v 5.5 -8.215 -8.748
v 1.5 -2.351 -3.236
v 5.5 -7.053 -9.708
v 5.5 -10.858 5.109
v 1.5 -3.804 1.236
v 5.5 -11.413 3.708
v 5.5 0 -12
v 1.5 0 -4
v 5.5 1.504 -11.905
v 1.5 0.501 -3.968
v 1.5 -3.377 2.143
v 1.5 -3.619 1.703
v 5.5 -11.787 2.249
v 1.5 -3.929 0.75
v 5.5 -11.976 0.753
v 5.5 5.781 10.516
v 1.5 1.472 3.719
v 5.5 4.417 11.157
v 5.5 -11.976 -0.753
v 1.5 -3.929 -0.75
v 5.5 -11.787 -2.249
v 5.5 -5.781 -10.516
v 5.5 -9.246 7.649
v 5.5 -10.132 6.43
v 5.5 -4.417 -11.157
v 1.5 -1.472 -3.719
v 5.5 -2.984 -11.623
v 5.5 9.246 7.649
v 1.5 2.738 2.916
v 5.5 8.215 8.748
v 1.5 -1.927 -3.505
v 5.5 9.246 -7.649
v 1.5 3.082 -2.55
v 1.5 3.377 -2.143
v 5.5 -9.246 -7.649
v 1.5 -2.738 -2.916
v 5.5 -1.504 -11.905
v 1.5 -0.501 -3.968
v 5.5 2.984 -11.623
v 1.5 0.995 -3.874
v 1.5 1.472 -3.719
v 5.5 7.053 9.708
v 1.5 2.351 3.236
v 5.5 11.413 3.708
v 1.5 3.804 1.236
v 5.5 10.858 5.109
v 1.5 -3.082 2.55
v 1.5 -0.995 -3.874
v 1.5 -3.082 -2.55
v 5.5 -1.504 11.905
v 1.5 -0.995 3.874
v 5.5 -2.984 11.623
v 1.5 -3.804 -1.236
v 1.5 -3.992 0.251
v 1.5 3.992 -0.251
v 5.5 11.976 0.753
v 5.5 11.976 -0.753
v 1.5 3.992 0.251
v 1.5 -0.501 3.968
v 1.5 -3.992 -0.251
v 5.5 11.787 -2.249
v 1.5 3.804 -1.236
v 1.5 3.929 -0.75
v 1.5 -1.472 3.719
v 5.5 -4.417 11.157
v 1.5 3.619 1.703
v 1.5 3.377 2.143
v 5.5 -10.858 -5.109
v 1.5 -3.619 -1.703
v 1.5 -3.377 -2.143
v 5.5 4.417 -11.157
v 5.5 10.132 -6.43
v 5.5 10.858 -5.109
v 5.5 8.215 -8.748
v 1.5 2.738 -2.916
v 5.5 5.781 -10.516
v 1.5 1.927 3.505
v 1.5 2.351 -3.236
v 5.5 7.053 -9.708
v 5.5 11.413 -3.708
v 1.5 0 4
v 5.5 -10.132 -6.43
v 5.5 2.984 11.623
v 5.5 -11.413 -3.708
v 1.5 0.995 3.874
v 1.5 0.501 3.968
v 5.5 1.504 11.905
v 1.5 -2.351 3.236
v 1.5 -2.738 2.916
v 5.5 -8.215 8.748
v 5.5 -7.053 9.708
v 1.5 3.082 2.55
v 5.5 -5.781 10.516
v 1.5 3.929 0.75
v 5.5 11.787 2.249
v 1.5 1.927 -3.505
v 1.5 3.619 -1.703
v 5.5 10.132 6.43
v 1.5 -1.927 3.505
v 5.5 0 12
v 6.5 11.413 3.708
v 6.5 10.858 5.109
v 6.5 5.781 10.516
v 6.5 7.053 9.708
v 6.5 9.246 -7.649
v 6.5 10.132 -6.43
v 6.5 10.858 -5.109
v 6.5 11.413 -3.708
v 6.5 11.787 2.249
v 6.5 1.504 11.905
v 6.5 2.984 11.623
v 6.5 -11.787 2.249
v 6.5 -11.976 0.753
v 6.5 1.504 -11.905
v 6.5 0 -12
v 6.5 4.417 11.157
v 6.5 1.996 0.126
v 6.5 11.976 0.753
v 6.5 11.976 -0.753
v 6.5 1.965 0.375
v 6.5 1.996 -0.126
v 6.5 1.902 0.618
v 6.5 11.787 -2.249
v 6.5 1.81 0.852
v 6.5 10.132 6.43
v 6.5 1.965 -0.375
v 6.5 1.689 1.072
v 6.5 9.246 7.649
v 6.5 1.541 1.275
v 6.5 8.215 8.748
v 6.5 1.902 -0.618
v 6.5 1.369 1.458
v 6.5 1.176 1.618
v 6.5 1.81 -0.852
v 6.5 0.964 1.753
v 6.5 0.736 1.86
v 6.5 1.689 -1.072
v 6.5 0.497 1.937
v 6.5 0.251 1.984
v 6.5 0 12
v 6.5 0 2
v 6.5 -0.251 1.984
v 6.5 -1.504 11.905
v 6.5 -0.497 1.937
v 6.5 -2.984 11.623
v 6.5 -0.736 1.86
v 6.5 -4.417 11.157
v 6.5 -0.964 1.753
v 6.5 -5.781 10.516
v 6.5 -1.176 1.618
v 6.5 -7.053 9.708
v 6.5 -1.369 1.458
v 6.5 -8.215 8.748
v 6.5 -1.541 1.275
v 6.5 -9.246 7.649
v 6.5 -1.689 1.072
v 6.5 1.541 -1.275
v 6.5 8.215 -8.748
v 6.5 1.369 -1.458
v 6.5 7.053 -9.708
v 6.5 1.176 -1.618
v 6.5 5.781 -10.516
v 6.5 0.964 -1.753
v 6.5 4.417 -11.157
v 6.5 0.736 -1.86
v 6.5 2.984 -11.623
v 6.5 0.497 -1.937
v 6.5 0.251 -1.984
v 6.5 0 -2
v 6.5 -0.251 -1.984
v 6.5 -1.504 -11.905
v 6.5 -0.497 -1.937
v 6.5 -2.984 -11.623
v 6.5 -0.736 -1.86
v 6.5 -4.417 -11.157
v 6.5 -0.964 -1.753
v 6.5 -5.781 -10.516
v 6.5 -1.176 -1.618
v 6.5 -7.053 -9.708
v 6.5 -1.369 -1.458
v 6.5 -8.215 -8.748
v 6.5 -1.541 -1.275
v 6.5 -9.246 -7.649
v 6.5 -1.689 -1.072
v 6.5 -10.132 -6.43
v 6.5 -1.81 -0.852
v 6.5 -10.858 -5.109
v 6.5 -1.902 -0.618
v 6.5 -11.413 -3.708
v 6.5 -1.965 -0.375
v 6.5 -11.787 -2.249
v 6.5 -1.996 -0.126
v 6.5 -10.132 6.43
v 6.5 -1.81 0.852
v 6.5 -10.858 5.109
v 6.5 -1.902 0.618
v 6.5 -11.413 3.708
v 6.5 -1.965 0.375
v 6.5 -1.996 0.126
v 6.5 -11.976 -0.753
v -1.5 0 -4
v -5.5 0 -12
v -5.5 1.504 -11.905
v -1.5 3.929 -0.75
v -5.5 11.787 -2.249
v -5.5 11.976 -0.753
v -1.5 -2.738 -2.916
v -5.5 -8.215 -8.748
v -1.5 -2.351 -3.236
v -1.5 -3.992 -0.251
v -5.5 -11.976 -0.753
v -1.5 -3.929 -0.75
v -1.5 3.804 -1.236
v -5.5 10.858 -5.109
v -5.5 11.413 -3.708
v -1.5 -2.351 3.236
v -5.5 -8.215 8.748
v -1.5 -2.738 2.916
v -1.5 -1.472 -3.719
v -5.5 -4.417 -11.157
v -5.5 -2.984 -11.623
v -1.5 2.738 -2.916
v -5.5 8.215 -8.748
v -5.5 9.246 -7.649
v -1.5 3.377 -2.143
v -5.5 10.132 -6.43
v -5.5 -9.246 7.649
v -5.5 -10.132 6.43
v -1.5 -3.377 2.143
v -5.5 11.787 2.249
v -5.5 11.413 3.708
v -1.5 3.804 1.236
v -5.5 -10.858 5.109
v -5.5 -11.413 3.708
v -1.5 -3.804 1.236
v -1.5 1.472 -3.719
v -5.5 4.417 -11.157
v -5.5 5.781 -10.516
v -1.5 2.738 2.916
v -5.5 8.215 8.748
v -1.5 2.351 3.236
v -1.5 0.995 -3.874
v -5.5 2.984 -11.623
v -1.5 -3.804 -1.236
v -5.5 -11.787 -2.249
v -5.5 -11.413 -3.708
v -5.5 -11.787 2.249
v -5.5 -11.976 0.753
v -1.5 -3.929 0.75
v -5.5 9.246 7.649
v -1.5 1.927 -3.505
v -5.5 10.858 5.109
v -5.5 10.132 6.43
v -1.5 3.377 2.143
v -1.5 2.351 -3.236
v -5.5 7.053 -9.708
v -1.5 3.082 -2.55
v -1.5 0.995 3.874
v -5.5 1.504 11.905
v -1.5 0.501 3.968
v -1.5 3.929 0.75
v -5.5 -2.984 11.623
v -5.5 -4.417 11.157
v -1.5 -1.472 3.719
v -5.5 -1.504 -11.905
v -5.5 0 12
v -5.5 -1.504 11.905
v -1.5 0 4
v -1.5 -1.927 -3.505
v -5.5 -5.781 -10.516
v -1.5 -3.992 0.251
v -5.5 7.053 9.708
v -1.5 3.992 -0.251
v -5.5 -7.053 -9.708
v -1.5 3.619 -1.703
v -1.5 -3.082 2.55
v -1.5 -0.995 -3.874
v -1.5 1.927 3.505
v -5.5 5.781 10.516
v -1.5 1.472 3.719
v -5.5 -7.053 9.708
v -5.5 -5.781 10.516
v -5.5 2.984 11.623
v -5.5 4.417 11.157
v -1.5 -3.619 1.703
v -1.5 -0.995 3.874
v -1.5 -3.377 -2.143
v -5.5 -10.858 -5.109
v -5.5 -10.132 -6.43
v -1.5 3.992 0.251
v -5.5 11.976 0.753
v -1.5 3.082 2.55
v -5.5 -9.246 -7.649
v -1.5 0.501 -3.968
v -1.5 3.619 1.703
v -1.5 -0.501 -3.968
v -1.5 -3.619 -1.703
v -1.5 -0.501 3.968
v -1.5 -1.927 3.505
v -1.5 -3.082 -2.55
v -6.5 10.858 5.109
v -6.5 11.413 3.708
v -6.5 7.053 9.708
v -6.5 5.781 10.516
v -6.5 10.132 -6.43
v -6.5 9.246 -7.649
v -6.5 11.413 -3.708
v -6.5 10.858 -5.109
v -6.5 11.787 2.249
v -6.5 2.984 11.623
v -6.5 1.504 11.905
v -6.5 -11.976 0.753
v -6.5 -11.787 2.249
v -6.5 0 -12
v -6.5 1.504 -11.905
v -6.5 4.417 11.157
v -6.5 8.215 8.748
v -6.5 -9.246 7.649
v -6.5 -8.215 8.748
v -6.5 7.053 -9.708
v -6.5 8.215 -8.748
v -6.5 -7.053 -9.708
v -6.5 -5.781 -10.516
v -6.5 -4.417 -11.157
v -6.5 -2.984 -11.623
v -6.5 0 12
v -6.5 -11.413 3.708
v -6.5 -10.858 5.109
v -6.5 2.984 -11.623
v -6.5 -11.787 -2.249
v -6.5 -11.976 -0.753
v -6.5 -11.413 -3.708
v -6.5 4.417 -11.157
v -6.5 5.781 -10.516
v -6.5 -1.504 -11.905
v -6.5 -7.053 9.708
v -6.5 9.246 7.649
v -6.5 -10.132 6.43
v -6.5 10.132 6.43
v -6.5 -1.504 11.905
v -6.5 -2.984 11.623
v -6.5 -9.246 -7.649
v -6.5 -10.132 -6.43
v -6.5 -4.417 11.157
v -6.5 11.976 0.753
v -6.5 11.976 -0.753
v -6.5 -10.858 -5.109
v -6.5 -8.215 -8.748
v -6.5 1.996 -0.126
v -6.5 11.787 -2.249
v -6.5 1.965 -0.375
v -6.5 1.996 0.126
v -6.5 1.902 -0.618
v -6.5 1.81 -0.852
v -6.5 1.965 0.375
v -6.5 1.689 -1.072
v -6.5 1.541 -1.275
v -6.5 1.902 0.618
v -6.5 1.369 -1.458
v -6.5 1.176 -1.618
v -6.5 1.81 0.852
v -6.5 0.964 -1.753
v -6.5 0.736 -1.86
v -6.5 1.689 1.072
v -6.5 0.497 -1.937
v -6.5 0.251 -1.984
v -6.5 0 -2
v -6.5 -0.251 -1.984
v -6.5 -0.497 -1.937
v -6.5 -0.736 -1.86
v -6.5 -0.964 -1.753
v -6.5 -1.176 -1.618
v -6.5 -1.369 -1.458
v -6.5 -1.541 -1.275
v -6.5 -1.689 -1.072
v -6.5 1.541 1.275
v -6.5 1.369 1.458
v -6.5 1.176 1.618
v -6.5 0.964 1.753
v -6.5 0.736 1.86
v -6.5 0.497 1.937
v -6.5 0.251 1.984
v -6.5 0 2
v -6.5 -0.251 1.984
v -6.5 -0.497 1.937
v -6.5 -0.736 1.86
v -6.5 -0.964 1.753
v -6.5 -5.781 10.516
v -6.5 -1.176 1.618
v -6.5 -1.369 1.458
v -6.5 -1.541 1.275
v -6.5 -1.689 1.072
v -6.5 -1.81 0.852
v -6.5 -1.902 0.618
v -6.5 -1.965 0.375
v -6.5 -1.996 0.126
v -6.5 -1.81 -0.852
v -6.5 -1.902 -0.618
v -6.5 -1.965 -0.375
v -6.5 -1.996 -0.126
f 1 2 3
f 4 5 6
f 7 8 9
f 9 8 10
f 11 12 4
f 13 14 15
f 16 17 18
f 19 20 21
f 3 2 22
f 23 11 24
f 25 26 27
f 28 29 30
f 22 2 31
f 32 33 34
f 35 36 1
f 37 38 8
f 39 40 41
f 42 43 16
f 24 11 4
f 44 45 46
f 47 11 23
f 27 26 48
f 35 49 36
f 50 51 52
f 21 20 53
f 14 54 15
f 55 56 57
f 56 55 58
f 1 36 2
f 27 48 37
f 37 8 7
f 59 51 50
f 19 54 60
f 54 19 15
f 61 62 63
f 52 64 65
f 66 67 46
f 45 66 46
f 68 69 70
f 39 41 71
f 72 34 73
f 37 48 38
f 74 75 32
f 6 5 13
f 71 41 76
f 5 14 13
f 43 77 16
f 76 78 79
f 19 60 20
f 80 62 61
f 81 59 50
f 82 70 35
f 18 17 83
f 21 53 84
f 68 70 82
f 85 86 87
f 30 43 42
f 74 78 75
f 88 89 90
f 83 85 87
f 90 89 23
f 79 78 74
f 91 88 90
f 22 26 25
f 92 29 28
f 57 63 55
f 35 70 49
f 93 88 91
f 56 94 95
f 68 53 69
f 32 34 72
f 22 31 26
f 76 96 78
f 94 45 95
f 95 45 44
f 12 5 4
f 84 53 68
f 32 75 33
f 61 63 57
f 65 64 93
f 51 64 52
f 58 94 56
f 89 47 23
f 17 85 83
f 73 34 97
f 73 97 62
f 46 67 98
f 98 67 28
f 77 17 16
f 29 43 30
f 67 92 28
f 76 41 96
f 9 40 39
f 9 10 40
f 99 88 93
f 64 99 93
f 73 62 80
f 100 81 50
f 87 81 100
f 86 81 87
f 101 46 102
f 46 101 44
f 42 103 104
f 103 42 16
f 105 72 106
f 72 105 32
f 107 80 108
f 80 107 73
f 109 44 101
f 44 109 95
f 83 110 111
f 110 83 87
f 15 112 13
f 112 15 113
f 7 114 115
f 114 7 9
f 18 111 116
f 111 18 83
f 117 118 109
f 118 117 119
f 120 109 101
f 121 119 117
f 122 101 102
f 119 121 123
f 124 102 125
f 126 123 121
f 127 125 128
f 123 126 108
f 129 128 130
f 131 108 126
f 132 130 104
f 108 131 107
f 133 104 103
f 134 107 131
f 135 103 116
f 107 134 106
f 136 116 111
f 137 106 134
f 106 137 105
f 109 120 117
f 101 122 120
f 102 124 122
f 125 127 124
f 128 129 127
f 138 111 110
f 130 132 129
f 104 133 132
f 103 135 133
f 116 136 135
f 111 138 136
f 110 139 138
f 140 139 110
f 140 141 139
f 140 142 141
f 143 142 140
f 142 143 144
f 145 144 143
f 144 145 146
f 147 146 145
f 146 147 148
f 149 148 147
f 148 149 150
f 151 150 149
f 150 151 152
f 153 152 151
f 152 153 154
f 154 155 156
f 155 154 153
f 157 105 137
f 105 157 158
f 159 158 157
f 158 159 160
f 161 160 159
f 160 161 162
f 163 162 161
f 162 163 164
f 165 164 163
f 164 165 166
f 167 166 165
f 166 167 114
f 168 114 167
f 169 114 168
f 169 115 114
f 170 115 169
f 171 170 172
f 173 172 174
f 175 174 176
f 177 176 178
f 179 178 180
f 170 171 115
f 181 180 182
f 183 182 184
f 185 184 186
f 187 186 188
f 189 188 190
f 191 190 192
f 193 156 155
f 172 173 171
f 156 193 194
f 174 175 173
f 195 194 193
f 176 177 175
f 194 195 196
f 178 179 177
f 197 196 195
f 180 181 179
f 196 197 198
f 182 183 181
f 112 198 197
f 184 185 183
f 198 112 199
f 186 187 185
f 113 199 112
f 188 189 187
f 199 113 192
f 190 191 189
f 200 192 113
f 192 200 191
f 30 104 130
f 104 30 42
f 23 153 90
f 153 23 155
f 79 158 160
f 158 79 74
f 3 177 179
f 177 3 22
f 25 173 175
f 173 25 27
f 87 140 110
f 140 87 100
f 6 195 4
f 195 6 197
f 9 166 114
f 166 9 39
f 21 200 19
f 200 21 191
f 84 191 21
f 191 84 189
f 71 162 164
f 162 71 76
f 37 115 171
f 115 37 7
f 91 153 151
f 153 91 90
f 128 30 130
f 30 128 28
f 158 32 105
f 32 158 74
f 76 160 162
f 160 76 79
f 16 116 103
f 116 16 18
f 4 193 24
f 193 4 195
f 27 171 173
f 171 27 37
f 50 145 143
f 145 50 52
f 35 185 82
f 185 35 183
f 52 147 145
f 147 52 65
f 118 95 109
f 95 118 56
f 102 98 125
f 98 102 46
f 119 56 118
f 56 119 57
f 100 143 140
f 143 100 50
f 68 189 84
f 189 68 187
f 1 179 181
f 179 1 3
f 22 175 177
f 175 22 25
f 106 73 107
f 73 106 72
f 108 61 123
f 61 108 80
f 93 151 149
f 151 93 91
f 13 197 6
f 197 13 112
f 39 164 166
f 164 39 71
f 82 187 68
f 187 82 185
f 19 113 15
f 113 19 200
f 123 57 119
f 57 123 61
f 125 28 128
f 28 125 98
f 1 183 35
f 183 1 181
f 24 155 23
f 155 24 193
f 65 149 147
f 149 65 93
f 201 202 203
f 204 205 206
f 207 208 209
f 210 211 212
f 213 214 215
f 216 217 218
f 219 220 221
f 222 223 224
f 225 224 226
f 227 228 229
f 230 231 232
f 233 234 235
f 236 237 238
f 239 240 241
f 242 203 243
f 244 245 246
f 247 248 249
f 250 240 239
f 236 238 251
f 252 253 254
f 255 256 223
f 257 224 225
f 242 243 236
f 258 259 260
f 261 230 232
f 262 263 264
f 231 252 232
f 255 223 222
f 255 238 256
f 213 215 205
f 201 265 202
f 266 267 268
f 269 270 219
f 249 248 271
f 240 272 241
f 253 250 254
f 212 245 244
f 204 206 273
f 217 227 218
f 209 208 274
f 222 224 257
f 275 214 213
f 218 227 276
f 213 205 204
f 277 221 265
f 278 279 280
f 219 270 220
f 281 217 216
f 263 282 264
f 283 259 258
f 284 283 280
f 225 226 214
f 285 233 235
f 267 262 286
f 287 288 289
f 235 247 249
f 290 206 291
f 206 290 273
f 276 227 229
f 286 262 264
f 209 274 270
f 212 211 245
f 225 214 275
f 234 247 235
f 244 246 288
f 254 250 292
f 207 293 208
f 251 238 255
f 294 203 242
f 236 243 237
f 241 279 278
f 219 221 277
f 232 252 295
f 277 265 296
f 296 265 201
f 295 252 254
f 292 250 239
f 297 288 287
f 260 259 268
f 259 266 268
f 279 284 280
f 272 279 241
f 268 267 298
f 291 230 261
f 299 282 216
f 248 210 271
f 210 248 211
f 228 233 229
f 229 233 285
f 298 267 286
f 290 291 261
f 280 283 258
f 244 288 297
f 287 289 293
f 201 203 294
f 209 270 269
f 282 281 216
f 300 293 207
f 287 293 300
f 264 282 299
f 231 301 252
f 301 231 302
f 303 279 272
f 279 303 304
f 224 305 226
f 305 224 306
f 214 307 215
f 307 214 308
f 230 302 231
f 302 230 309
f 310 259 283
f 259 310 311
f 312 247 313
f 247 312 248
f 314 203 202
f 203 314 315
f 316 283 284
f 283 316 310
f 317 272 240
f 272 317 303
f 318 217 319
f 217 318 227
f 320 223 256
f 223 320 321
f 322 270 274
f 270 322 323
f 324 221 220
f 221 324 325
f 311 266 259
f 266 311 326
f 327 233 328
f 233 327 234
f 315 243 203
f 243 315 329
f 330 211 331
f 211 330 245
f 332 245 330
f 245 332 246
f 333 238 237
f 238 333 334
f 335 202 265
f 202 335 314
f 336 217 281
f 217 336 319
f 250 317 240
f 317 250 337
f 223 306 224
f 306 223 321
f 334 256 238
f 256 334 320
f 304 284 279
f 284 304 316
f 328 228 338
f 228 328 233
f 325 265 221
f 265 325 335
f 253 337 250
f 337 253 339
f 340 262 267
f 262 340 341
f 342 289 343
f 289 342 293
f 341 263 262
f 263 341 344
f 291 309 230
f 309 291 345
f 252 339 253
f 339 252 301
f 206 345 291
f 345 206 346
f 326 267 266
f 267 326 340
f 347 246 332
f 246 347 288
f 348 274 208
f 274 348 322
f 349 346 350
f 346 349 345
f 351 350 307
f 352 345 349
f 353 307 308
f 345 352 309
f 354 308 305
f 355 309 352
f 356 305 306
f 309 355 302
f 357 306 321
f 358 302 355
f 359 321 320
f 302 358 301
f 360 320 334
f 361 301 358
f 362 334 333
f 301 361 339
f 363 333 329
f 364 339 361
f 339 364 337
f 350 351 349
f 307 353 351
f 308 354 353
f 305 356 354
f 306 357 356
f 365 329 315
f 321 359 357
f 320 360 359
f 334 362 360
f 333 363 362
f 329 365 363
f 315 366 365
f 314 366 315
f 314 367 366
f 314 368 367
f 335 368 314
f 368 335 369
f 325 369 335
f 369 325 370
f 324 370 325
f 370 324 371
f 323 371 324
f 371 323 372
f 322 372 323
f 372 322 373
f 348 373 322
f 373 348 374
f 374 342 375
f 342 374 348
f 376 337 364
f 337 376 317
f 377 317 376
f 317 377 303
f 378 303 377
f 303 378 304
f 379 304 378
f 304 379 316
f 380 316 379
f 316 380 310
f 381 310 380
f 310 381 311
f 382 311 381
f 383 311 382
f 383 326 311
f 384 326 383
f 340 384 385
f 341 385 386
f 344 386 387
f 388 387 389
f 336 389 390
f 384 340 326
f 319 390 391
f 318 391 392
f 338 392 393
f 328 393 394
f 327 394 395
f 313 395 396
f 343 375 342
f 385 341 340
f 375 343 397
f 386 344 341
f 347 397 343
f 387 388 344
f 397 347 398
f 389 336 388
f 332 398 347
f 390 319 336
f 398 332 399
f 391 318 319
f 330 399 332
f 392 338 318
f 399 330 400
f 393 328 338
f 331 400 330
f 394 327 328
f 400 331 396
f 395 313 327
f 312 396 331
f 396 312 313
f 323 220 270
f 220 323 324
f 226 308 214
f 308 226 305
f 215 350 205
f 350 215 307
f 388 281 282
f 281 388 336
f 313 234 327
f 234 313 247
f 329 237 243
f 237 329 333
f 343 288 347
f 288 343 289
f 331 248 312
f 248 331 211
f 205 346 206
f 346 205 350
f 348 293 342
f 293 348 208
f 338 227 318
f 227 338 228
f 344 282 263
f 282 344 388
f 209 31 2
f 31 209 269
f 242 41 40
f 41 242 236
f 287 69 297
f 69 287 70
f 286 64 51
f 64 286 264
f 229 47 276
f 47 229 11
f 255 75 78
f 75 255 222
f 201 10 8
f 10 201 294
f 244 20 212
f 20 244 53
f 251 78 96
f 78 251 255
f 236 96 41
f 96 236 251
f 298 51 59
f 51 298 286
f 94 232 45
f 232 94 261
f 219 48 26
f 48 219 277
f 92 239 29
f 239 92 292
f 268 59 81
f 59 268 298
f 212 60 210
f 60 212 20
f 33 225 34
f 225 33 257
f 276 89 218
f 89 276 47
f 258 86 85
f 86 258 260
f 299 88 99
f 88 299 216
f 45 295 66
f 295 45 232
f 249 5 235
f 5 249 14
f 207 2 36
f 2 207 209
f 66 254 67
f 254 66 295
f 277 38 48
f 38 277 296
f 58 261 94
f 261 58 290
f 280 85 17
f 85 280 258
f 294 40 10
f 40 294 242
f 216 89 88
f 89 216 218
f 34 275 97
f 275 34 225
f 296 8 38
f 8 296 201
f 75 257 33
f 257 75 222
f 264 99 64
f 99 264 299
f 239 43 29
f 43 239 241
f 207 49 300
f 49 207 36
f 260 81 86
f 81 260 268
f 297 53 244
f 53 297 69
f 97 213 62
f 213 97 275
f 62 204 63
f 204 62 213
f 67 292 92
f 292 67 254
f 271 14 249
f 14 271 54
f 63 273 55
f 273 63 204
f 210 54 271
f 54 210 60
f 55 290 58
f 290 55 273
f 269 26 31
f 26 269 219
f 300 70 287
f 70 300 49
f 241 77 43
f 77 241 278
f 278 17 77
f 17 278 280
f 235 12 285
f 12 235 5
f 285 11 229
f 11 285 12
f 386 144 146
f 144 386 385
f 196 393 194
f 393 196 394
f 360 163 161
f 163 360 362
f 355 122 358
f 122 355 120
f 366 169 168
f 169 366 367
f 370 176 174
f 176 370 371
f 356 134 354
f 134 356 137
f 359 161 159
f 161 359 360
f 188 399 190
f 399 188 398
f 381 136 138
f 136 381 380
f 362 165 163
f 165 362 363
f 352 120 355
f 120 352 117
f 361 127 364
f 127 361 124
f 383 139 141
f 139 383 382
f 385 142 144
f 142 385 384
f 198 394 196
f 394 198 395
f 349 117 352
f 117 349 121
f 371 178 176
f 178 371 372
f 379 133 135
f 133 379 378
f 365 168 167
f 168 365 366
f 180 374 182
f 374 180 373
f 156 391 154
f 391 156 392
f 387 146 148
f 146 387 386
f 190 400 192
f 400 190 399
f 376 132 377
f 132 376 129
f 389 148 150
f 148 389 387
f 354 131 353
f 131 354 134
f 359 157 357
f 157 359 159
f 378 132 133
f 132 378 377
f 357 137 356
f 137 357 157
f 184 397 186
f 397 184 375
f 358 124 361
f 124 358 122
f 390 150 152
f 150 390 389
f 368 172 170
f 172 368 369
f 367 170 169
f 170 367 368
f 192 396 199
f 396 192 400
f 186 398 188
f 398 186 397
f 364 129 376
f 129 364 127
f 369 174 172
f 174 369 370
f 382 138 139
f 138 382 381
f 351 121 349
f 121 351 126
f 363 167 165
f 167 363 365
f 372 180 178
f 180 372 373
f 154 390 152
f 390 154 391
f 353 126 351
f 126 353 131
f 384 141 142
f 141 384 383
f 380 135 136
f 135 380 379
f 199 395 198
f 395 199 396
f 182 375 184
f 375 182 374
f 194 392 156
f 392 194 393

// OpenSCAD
module reel(){
  difference(){
   union(){
    translate([3.5,0,0]) rotate([0,90,0]) cylinder(h = 4, r1 = 4, r2 = 12, center=true);
translate([6,0,0]) rotate([0,90,0]) cylinder(h = 1, r = 12, center=true);
    translate([-3.5,0,0]) rotate([0,90,0]) cylinder(h = 4, r1 = 12, r2 = 4, center=true);
    translate([-6,0,0]) rotate([0,90,0]) cylinder(h = 1, r = 12, center=true);
    rotate([0,90,0]) cylinder(h=7,r=4, center=true);
  }
  rotate([0,90,0]) cylinder(h=16,r=2, center=true);
 }
}

$fn=50;
reel();
